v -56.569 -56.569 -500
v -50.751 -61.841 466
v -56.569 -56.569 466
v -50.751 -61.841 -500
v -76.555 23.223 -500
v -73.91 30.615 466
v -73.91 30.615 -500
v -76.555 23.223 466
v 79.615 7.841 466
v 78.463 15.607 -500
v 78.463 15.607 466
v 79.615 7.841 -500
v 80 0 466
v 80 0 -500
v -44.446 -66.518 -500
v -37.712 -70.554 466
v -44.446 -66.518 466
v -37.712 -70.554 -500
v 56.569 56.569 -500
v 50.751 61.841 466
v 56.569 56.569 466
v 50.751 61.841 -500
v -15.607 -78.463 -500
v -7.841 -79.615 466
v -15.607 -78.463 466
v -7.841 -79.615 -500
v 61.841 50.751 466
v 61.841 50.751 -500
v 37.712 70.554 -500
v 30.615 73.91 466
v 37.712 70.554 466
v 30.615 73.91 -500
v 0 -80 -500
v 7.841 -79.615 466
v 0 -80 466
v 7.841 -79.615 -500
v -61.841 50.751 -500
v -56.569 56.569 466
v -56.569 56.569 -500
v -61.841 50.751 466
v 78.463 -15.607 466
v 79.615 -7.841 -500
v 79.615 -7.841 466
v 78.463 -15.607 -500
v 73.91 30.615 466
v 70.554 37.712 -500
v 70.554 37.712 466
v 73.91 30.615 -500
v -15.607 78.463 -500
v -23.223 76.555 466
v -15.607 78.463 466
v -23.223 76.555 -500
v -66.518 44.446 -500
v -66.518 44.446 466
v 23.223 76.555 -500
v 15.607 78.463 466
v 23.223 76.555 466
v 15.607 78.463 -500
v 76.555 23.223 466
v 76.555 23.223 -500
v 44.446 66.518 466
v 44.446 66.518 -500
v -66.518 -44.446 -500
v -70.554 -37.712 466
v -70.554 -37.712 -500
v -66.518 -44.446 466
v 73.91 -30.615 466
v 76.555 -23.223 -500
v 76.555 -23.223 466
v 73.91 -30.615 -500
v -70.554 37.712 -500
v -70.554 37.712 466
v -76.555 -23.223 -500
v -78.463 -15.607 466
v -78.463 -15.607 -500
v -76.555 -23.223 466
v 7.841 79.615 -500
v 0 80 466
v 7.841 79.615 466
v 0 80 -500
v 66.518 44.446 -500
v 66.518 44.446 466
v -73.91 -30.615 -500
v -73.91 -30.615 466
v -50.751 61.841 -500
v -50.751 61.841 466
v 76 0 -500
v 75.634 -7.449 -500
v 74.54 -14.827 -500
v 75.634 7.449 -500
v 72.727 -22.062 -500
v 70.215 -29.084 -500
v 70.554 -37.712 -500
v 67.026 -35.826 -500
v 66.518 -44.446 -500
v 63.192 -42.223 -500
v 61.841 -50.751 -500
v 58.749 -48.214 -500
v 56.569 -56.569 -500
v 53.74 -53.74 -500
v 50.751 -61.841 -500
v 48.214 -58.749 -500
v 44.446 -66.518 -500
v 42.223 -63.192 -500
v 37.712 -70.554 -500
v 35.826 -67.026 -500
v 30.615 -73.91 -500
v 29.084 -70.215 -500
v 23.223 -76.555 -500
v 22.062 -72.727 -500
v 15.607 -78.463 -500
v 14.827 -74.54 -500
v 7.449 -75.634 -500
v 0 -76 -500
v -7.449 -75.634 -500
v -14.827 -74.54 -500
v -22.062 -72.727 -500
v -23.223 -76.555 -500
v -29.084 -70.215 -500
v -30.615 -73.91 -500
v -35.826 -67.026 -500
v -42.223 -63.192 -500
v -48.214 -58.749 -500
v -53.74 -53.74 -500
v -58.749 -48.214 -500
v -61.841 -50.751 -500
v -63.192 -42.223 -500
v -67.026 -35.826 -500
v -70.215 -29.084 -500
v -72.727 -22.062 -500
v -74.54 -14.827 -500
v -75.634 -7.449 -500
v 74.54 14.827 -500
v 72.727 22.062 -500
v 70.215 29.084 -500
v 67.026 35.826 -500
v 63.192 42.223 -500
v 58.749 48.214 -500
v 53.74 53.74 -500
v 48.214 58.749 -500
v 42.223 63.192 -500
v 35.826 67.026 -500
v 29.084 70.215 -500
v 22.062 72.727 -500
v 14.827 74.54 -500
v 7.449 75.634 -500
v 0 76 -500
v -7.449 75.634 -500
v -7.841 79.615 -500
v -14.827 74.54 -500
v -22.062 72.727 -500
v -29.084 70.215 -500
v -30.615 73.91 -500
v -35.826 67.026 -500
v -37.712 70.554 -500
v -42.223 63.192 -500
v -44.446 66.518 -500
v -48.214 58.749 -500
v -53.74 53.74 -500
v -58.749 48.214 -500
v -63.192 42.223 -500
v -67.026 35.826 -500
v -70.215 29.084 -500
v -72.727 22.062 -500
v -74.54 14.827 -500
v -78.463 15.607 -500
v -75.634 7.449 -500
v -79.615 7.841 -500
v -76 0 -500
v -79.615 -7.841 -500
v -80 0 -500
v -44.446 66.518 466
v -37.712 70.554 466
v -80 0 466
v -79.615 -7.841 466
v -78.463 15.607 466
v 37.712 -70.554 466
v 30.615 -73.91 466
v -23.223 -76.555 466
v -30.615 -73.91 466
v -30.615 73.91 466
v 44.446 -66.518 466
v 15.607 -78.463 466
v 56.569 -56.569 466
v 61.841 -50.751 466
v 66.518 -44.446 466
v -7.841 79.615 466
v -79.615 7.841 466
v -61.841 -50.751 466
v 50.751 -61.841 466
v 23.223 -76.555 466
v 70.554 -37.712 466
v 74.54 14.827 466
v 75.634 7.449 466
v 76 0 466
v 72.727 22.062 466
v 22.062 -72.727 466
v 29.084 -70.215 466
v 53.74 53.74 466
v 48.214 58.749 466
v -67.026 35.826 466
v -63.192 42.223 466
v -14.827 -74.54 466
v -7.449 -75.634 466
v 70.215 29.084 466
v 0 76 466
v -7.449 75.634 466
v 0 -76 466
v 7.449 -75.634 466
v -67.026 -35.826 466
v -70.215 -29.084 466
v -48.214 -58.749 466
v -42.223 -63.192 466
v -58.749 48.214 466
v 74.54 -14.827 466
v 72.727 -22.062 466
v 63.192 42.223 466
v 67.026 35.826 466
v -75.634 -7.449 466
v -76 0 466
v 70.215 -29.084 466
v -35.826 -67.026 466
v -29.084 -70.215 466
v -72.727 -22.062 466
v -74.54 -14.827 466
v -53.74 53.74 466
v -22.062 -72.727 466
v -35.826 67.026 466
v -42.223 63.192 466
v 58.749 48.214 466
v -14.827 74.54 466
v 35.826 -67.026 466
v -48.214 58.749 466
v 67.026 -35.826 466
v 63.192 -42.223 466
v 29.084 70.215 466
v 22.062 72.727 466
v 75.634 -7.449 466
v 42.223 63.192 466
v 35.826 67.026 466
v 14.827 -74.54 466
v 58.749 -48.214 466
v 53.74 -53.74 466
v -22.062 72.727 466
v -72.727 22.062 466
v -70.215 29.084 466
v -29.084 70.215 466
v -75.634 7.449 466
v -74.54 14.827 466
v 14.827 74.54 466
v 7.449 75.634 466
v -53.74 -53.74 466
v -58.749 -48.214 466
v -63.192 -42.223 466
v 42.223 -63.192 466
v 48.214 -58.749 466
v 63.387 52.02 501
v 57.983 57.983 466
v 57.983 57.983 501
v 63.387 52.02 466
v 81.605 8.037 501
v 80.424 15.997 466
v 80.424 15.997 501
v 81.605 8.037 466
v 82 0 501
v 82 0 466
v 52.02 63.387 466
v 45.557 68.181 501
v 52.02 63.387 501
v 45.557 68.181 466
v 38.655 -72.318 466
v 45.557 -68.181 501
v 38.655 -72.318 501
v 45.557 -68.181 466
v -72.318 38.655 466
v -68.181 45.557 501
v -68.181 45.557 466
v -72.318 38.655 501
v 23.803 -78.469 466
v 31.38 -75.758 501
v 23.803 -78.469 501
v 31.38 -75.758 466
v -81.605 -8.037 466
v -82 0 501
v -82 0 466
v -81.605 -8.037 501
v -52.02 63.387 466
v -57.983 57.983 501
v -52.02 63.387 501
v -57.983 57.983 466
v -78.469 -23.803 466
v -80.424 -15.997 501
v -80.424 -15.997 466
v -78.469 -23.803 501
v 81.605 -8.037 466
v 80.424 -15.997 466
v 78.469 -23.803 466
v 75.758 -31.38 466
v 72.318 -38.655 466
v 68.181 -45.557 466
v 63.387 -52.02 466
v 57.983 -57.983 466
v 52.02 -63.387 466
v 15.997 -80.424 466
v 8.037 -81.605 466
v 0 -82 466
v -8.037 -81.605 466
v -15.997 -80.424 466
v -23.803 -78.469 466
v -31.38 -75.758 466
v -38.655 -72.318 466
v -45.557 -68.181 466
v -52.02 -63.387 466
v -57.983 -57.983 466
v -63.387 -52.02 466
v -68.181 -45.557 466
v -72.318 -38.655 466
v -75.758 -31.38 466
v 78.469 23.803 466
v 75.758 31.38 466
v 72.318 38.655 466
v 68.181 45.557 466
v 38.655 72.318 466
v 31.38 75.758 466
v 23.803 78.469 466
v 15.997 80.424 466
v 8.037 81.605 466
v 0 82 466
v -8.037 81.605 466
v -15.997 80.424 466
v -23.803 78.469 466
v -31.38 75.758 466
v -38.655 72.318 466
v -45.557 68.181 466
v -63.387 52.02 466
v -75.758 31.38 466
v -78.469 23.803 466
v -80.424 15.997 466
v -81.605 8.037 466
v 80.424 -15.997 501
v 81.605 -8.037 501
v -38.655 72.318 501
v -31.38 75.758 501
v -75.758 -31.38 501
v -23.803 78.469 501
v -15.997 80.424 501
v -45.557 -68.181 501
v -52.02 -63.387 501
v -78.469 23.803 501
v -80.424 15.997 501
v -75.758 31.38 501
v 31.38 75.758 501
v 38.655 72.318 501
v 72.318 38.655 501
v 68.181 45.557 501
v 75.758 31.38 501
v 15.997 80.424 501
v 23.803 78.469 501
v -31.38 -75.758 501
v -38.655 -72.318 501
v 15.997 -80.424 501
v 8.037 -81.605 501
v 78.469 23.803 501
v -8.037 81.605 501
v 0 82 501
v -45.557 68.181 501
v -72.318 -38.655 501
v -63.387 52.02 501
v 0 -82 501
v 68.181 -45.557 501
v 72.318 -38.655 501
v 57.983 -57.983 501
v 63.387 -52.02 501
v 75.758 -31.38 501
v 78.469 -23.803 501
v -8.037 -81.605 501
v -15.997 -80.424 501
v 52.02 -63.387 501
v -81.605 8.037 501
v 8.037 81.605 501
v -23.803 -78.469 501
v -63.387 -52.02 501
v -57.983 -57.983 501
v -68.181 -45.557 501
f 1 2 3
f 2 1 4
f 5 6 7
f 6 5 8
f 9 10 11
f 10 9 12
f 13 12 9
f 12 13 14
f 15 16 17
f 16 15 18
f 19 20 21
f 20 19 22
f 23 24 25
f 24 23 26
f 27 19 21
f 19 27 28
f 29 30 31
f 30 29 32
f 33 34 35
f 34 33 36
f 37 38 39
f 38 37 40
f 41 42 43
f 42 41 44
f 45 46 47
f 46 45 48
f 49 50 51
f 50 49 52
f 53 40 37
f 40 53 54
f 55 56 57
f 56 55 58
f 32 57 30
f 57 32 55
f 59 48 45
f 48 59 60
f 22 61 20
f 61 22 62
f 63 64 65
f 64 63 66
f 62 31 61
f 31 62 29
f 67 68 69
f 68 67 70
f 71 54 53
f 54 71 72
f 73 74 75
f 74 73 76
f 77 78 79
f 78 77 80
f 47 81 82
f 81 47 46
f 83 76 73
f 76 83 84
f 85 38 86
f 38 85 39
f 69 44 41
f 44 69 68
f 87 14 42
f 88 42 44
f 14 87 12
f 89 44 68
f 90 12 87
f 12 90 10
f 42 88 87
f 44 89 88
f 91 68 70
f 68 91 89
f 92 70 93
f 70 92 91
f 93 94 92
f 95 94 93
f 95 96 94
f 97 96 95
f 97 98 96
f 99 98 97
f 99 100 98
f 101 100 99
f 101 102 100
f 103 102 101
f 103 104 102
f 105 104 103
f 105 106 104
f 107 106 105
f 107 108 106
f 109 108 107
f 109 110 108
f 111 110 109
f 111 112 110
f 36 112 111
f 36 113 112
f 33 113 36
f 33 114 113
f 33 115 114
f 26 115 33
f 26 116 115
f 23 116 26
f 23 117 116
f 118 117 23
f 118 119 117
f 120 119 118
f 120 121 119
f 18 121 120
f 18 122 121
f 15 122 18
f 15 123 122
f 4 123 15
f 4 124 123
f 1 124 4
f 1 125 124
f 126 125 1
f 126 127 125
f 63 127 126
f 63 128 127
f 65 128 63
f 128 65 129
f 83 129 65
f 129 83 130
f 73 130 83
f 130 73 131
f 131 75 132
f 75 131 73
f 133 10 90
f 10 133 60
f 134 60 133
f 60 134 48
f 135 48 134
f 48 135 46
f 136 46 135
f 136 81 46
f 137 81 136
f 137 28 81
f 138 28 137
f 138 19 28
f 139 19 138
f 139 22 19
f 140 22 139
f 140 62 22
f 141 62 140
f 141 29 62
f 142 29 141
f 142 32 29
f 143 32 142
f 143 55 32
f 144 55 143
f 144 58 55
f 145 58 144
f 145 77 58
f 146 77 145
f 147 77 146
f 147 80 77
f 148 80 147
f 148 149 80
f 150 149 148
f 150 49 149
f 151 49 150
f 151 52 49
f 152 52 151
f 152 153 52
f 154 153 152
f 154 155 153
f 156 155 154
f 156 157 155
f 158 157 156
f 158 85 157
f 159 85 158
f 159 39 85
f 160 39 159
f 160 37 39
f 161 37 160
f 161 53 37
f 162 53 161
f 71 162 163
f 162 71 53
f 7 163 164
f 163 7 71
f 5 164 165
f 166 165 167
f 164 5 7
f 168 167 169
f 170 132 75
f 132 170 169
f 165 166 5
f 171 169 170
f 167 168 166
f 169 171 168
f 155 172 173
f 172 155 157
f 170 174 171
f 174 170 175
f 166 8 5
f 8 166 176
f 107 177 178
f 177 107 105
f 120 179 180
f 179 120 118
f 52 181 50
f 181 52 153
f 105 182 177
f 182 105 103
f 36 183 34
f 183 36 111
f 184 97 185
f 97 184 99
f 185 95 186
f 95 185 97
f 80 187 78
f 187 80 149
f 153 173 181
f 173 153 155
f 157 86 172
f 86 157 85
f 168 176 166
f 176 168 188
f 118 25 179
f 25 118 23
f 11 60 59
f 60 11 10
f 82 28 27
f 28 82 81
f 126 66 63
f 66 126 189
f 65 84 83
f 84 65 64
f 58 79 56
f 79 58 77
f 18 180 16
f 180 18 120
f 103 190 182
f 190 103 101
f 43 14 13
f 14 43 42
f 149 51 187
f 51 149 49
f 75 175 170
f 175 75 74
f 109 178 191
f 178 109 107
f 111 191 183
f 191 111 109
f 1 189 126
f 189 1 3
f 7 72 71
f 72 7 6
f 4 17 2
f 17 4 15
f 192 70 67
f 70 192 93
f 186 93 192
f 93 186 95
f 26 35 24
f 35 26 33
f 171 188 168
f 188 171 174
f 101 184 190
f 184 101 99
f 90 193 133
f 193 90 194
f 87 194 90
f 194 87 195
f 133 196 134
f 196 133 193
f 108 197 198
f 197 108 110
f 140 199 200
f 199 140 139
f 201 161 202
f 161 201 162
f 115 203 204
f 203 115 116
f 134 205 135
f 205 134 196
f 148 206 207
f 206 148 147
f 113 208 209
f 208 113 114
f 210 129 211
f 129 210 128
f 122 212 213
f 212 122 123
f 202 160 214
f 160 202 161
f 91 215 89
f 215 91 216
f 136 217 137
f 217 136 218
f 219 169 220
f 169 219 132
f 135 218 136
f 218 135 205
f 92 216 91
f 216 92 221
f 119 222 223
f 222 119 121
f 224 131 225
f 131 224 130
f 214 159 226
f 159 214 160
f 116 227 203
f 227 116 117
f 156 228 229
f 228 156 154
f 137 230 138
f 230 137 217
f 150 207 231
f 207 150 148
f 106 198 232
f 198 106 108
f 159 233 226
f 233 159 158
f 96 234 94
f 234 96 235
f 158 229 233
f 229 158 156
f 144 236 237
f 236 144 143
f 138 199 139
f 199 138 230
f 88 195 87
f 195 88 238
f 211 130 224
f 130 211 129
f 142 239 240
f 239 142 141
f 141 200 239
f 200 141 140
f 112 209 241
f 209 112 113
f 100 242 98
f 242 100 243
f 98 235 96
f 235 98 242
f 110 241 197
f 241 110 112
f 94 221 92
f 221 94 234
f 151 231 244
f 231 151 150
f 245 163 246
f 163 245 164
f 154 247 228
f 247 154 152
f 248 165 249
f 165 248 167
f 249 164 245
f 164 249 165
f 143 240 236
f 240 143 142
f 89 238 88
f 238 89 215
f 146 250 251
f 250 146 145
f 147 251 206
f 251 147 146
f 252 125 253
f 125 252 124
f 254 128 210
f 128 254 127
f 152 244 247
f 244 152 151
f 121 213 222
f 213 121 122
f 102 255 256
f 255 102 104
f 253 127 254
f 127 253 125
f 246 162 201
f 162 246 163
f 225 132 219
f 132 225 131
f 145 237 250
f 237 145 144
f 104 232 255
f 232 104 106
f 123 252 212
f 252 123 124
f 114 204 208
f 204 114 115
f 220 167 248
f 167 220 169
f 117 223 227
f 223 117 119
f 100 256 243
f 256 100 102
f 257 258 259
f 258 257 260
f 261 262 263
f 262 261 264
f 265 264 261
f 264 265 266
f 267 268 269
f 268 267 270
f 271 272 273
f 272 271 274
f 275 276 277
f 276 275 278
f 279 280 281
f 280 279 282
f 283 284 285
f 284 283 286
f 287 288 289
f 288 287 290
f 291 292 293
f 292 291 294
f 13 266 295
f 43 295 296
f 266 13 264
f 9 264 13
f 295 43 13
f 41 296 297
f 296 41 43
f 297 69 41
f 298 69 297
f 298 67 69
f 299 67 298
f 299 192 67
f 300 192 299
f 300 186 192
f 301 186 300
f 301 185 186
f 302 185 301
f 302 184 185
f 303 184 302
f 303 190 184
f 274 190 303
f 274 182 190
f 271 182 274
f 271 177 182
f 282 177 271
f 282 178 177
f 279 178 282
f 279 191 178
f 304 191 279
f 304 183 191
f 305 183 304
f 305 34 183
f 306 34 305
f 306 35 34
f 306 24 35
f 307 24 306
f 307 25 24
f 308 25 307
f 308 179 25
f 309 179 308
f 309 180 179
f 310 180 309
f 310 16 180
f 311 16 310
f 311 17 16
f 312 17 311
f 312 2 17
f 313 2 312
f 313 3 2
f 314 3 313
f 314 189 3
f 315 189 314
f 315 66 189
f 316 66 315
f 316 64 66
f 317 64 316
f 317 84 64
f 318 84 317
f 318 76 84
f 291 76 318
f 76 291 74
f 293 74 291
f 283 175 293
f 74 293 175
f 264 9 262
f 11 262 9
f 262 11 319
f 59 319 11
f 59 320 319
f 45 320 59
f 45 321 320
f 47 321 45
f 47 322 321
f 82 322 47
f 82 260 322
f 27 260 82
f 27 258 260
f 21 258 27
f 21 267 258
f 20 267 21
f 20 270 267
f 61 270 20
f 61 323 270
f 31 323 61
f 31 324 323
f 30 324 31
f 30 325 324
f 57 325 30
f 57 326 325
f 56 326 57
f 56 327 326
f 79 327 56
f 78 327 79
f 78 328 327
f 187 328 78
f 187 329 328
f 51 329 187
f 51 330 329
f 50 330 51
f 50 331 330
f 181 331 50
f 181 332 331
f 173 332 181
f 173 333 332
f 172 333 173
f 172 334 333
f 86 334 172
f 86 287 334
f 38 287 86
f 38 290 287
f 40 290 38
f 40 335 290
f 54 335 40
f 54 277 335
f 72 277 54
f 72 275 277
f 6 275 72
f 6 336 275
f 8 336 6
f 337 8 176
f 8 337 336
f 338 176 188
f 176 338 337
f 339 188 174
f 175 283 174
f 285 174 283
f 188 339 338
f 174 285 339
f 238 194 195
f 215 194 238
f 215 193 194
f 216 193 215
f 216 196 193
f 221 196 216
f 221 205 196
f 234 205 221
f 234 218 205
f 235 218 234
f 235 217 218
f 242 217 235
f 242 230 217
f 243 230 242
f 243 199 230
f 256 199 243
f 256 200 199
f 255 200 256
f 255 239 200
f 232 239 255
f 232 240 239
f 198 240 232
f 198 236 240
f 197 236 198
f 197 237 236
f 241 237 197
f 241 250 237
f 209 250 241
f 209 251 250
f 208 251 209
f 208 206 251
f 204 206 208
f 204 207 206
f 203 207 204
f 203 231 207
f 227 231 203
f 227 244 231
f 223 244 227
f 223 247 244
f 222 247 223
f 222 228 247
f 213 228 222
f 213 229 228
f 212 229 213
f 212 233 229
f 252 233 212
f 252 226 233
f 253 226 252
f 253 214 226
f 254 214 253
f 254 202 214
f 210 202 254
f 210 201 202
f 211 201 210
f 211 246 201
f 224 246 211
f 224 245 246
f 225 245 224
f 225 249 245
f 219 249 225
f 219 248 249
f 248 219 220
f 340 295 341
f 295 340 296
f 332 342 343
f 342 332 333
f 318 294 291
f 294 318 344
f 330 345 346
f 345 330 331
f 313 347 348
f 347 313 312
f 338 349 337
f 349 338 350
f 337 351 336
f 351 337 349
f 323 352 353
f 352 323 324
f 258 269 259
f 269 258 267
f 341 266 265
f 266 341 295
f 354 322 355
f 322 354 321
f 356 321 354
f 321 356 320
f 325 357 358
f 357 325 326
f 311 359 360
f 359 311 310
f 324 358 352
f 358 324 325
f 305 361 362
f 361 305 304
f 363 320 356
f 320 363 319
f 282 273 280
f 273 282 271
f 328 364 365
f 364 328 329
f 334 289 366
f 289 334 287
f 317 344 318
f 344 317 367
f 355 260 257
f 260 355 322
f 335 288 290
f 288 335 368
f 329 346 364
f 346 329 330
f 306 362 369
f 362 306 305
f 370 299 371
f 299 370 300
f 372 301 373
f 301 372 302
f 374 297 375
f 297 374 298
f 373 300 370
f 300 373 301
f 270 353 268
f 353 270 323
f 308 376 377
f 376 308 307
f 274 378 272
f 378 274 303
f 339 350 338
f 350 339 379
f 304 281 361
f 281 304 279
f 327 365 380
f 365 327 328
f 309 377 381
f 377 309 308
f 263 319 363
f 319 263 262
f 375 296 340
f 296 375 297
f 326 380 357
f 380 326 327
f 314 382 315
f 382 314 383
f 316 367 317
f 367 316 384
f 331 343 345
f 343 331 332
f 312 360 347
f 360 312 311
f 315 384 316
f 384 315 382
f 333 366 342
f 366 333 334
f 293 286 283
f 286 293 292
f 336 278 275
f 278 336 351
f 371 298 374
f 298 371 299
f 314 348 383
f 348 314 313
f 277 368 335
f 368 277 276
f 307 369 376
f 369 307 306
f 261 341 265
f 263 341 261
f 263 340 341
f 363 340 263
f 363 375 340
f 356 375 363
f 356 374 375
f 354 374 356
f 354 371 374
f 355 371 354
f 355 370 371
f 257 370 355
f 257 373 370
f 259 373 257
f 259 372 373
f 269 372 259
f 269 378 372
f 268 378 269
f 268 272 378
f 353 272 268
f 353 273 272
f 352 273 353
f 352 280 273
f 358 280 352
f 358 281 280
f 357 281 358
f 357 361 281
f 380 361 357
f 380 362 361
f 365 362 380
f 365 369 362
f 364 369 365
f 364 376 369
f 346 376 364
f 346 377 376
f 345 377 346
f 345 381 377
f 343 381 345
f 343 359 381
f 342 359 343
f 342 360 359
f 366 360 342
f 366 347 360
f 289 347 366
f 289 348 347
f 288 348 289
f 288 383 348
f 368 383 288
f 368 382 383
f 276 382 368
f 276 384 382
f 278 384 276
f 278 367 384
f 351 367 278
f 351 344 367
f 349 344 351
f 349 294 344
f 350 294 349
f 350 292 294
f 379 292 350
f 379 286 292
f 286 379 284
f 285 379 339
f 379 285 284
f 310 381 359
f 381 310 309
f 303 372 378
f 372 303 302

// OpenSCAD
// Parameters
pipe_standard = 1; //[1:1:1]
nominal_diameter = 160; //[80:320:1]
length_mm = 1000; //[500:2000:10]
od_mm = 160; //[120:200:1]
wall_thickness_mm = 4.0; //[2.0:8.0:0.5]
interface_length_mm = 35; //[15:80:1]
interface_radial_add_mm = 2.0; //[0.5:6.0:0.5]
connect_overlap_mm = 1.0; //[0.5:2.0:0.5]

// HT Pipe - complete geometry
module ht_pipe() {
  color([0.85, 0.85, 0.8]) { // PVC color
    difference() {
      // Outer pipe
      cylinder(h=length_mm, r=od_mm/2, center=true, $fn=64);
      // Hollow bore
      translate([0, 0, 0])
        cylinder(h=length_mm + 2*connect_overlap_mm, r=od_mm/2 - wall_thickness_mm, center=true, $fn=64);
    }
    // End fitting interface
    translate([0, 0, length_mm/2 - interface_length_mm/2 + connect_overlap_mm])
      cylinder(h=interface_length_mm, r=od_mm/2 + interface_radial_add_mm, center=true, $fn=64);
  }
}

// Assembly
module assembly() {
  ht_pipe();
}

assembly();
